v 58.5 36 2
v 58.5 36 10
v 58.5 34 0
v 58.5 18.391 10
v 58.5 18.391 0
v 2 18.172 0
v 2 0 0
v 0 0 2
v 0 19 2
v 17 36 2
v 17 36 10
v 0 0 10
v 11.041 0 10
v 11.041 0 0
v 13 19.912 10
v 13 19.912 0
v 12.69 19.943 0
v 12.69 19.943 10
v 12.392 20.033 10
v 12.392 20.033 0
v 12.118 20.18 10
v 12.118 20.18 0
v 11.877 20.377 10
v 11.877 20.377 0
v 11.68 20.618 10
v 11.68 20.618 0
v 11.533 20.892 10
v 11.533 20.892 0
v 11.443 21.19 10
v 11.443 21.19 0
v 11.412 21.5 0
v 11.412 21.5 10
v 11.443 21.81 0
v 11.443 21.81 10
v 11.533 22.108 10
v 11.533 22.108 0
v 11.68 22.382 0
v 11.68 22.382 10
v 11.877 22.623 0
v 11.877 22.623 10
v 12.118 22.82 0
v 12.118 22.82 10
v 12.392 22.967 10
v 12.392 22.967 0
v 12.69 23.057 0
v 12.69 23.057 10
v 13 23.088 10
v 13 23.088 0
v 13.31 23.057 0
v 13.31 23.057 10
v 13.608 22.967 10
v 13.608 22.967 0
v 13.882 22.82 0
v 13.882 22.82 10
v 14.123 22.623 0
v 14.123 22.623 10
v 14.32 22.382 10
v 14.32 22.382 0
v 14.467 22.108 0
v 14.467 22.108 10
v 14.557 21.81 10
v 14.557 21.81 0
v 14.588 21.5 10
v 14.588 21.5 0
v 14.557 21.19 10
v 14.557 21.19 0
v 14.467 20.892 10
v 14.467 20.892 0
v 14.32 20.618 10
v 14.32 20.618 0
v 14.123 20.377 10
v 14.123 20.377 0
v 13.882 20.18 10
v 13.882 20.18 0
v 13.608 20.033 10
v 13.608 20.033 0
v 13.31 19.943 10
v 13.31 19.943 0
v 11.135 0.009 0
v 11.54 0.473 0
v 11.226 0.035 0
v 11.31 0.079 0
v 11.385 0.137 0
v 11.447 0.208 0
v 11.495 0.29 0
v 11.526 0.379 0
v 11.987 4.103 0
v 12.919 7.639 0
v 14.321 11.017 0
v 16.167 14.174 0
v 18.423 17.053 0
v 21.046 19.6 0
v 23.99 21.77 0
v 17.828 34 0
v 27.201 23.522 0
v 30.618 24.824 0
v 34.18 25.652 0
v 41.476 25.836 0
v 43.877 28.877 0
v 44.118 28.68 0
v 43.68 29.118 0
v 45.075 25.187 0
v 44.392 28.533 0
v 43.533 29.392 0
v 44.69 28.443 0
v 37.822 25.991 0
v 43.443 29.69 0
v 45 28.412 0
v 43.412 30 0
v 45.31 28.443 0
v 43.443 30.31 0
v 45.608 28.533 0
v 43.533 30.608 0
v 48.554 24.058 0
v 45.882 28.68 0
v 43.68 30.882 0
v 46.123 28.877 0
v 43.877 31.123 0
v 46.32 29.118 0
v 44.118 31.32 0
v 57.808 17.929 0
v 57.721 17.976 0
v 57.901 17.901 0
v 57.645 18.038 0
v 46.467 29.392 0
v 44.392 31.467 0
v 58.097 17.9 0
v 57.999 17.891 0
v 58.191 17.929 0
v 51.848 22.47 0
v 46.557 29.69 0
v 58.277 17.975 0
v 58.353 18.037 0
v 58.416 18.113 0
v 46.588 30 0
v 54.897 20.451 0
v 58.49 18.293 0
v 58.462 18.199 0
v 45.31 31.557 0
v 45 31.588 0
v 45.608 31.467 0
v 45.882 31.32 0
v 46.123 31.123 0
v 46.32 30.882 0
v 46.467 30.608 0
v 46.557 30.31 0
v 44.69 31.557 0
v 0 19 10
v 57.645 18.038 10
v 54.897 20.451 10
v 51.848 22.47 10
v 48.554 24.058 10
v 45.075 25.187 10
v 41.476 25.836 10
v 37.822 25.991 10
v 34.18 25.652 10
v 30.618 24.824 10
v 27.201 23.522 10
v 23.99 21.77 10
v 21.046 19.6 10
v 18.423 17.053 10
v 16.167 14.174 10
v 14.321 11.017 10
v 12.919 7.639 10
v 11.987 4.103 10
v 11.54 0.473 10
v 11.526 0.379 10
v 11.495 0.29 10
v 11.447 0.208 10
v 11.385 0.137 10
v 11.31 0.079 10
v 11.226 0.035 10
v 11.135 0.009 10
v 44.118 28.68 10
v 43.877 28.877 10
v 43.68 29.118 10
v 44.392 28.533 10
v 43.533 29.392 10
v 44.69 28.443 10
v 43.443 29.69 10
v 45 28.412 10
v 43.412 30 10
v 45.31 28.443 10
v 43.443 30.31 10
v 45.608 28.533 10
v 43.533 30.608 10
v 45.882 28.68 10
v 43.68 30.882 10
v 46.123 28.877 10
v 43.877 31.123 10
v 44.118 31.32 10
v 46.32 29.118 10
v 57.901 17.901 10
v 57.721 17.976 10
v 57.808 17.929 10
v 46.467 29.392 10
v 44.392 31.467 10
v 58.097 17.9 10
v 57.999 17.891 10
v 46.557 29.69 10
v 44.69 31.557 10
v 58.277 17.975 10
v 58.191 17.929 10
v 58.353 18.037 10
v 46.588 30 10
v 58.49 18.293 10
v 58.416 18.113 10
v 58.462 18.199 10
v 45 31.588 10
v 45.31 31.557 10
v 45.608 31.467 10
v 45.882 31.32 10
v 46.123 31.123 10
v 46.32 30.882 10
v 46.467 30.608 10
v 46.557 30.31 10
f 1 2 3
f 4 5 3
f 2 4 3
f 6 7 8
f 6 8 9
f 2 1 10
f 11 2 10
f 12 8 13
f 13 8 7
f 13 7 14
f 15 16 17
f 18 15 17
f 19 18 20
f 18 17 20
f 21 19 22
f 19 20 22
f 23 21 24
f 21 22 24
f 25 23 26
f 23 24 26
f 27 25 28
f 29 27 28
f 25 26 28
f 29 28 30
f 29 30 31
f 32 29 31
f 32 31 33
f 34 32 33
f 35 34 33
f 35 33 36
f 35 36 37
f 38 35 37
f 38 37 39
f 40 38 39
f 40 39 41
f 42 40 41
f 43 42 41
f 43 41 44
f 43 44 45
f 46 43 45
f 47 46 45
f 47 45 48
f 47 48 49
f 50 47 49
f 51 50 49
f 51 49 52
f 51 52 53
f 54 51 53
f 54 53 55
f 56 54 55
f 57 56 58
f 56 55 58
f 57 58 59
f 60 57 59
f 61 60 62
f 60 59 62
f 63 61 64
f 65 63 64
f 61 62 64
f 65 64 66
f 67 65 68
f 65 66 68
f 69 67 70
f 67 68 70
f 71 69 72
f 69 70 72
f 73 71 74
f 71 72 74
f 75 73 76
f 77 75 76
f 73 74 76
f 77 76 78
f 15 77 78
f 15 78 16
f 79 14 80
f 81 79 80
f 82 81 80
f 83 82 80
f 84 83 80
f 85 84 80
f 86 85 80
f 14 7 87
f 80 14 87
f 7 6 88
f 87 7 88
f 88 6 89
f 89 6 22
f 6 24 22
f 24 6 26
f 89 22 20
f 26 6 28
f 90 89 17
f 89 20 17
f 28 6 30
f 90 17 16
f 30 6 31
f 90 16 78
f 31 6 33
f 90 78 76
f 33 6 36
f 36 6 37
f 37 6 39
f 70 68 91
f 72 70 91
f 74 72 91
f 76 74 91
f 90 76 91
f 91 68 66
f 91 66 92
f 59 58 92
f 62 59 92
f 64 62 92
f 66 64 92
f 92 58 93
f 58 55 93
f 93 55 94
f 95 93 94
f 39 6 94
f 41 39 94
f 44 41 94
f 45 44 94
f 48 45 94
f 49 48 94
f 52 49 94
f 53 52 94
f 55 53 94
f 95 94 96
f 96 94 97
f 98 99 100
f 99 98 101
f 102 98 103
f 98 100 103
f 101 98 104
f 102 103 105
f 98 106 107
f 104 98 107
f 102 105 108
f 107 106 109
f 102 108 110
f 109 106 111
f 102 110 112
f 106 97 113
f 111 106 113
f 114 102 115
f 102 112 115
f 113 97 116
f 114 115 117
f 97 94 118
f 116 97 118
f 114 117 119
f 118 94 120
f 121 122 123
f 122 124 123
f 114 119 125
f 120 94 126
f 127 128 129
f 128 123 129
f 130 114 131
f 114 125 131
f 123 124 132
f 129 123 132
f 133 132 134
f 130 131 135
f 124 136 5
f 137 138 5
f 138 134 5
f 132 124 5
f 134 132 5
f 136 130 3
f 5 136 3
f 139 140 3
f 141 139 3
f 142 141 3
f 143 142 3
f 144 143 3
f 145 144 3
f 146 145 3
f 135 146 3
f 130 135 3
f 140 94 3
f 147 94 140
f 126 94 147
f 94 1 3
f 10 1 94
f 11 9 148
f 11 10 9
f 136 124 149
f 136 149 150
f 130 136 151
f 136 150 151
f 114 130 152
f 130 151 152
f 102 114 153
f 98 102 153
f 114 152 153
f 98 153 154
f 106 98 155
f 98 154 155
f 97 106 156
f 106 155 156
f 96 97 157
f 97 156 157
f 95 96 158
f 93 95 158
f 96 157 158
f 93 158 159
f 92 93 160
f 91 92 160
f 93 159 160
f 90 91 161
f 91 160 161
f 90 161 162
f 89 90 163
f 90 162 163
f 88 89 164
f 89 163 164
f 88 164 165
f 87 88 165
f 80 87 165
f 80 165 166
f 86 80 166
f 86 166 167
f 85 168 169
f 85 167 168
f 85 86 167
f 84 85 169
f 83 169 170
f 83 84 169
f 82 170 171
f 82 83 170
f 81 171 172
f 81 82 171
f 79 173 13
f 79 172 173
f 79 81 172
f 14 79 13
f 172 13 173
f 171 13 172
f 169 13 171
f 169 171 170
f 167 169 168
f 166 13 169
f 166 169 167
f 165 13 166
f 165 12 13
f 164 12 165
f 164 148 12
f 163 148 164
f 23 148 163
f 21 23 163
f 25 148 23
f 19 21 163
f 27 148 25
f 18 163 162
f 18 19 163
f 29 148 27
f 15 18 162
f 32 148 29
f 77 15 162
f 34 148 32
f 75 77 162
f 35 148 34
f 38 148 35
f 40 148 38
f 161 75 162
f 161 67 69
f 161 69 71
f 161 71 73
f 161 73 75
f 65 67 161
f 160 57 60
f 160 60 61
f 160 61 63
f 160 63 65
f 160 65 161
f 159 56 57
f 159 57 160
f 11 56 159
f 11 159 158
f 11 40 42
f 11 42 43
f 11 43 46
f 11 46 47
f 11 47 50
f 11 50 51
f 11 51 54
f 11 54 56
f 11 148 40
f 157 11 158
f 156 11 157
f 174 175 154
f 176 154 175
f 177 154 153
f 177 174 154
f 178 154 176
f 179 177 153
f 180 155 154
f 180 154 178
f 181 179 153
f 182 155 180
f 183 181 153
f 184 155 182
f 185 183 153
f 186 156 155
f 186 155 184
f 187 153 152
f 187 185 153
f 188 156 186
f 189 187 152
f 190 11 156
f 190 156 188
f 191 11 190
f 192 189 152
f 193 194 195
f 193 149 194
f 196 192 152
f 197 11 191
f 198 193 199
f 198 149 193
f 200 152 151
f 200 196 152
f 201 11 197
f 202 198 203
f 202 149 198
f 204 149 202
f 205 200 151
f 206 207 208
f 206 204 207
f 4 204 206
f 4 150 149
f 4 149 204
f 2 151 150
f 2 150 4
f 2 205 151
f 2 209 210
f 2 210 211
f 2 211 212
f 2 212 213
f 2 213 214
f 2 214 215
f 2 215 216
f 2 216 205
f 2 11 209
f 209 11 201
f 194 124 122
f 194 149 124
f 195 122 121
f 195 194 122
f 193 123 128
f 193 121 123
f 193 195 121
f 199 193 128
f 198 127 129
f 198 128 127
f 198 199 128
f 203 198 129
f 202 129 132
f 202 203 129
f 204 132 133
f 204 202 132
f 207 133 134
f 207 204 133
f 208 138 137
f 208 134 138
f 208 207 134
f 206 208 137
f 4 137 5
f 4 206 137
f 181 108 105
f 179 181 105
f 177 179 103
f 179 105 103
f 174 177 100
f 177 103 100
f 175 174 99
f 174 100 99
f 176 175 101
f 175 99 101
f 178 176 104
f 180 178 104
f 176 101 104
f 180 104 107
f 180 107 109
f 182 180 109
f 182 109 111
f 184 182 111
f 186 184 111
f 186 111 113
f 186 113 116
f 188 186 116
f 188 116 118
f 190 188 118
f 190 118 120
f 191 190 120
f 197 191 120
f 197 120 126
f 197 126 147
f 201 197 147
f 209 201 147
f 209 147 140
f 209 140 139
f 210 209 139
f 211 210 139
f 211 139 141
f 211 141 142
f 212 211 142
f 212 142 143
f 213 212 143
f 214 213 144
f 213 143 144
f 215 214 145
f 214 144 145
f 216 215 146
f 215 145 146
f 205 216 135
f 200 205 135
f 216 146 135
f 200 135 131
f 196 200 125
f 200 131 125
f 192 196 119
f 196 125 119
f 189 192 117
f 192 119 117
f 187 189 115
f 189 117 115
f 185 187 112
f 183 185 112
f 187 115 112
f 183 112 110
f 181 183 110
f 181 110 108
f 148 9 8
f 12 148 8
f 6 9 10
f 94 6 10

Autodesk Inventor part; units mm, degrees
ref_plane "YZ Plane" through (0, 0, 0) normal (1, 0, 0) x (0, 1, 0)
ref_plane "XZ Plane" through (0, 0, 0) normal (0, 1, 0) x (-1, 0, 0)
ref_plane "XY Plane" through (0, 0, 0) normal (0, 0, 1) x (1, 0, 0)
sketch "Sketch1" plane through (0, 0, 0) normal (0, 0, 1) x (1, 0, 0)
  line L0 (0, 0) -> (58.5, 0)
  line L1 (58.5, 0) -> (58.5, 36)
  line L2 (58.5, 36) -> (0, 36)
  line L3 (0, 36) -> (0, 0)
  dimension "d0" = 58.5
  dimension "d1" = 36
extrude "Extrusion1" add sketch "Sketch1" along normal blind 10
sketch "Sketch2" plane through (0, 0, 10) normal (0, 0, 1) x (1, 0, 0)
  line L0 (0, 0) -> (0, 36) projected
  line L1 (58.5, 0) -> (0, 0) projected
  circle A0 centre (38.5, -1) radius 27
  dimension "d6" = 27
  dimension "d7" = 1
  dimension "d8" = 11.5
extrude "Extrusion2" cut sketch "Sketch2" against normal blind 10
sketch "Sketch3" plane through (0, 0, 10) normal (0, 0, 1) x (1, 0, 0)
  line L0 (58.5, 36) -> (58.5, 17.1384) projected
  line L1 (11.5185, 0) -> (0, 0) projected
  line L2 (0, 36) -> (58.5, 36) projected
  point P0 (13, 21.5)
  point P1 (45, 30)
  dimension "d11" = 32
  dimension "d12" = 13.5
  dimension "d13" = 21.5
  dimension "d28" = 6
hole "Hole1" at (13, 21.5, 10) at (45, 30, 10) direction (0, 0, -1) diameter 3.175 depth 10 tip angle 118
chamfer "Chamfer1" distance 17 angle 45 1 edges at (0, 36, 5)
chamfer "Chamfer2" distance 2 angle 45 3 edges at (37.75, 36, 0) (8.5, 27.5, 0) (0, 9.5, 0)
fillet "Fillet1" radius 0.5 2 edges at (58.5, 17.1384, 5) (11.5185, 0, 5)
properties part number "PÁRA-LAMAS DIANTEIRO-ESQ" material "Carbon Steel"
